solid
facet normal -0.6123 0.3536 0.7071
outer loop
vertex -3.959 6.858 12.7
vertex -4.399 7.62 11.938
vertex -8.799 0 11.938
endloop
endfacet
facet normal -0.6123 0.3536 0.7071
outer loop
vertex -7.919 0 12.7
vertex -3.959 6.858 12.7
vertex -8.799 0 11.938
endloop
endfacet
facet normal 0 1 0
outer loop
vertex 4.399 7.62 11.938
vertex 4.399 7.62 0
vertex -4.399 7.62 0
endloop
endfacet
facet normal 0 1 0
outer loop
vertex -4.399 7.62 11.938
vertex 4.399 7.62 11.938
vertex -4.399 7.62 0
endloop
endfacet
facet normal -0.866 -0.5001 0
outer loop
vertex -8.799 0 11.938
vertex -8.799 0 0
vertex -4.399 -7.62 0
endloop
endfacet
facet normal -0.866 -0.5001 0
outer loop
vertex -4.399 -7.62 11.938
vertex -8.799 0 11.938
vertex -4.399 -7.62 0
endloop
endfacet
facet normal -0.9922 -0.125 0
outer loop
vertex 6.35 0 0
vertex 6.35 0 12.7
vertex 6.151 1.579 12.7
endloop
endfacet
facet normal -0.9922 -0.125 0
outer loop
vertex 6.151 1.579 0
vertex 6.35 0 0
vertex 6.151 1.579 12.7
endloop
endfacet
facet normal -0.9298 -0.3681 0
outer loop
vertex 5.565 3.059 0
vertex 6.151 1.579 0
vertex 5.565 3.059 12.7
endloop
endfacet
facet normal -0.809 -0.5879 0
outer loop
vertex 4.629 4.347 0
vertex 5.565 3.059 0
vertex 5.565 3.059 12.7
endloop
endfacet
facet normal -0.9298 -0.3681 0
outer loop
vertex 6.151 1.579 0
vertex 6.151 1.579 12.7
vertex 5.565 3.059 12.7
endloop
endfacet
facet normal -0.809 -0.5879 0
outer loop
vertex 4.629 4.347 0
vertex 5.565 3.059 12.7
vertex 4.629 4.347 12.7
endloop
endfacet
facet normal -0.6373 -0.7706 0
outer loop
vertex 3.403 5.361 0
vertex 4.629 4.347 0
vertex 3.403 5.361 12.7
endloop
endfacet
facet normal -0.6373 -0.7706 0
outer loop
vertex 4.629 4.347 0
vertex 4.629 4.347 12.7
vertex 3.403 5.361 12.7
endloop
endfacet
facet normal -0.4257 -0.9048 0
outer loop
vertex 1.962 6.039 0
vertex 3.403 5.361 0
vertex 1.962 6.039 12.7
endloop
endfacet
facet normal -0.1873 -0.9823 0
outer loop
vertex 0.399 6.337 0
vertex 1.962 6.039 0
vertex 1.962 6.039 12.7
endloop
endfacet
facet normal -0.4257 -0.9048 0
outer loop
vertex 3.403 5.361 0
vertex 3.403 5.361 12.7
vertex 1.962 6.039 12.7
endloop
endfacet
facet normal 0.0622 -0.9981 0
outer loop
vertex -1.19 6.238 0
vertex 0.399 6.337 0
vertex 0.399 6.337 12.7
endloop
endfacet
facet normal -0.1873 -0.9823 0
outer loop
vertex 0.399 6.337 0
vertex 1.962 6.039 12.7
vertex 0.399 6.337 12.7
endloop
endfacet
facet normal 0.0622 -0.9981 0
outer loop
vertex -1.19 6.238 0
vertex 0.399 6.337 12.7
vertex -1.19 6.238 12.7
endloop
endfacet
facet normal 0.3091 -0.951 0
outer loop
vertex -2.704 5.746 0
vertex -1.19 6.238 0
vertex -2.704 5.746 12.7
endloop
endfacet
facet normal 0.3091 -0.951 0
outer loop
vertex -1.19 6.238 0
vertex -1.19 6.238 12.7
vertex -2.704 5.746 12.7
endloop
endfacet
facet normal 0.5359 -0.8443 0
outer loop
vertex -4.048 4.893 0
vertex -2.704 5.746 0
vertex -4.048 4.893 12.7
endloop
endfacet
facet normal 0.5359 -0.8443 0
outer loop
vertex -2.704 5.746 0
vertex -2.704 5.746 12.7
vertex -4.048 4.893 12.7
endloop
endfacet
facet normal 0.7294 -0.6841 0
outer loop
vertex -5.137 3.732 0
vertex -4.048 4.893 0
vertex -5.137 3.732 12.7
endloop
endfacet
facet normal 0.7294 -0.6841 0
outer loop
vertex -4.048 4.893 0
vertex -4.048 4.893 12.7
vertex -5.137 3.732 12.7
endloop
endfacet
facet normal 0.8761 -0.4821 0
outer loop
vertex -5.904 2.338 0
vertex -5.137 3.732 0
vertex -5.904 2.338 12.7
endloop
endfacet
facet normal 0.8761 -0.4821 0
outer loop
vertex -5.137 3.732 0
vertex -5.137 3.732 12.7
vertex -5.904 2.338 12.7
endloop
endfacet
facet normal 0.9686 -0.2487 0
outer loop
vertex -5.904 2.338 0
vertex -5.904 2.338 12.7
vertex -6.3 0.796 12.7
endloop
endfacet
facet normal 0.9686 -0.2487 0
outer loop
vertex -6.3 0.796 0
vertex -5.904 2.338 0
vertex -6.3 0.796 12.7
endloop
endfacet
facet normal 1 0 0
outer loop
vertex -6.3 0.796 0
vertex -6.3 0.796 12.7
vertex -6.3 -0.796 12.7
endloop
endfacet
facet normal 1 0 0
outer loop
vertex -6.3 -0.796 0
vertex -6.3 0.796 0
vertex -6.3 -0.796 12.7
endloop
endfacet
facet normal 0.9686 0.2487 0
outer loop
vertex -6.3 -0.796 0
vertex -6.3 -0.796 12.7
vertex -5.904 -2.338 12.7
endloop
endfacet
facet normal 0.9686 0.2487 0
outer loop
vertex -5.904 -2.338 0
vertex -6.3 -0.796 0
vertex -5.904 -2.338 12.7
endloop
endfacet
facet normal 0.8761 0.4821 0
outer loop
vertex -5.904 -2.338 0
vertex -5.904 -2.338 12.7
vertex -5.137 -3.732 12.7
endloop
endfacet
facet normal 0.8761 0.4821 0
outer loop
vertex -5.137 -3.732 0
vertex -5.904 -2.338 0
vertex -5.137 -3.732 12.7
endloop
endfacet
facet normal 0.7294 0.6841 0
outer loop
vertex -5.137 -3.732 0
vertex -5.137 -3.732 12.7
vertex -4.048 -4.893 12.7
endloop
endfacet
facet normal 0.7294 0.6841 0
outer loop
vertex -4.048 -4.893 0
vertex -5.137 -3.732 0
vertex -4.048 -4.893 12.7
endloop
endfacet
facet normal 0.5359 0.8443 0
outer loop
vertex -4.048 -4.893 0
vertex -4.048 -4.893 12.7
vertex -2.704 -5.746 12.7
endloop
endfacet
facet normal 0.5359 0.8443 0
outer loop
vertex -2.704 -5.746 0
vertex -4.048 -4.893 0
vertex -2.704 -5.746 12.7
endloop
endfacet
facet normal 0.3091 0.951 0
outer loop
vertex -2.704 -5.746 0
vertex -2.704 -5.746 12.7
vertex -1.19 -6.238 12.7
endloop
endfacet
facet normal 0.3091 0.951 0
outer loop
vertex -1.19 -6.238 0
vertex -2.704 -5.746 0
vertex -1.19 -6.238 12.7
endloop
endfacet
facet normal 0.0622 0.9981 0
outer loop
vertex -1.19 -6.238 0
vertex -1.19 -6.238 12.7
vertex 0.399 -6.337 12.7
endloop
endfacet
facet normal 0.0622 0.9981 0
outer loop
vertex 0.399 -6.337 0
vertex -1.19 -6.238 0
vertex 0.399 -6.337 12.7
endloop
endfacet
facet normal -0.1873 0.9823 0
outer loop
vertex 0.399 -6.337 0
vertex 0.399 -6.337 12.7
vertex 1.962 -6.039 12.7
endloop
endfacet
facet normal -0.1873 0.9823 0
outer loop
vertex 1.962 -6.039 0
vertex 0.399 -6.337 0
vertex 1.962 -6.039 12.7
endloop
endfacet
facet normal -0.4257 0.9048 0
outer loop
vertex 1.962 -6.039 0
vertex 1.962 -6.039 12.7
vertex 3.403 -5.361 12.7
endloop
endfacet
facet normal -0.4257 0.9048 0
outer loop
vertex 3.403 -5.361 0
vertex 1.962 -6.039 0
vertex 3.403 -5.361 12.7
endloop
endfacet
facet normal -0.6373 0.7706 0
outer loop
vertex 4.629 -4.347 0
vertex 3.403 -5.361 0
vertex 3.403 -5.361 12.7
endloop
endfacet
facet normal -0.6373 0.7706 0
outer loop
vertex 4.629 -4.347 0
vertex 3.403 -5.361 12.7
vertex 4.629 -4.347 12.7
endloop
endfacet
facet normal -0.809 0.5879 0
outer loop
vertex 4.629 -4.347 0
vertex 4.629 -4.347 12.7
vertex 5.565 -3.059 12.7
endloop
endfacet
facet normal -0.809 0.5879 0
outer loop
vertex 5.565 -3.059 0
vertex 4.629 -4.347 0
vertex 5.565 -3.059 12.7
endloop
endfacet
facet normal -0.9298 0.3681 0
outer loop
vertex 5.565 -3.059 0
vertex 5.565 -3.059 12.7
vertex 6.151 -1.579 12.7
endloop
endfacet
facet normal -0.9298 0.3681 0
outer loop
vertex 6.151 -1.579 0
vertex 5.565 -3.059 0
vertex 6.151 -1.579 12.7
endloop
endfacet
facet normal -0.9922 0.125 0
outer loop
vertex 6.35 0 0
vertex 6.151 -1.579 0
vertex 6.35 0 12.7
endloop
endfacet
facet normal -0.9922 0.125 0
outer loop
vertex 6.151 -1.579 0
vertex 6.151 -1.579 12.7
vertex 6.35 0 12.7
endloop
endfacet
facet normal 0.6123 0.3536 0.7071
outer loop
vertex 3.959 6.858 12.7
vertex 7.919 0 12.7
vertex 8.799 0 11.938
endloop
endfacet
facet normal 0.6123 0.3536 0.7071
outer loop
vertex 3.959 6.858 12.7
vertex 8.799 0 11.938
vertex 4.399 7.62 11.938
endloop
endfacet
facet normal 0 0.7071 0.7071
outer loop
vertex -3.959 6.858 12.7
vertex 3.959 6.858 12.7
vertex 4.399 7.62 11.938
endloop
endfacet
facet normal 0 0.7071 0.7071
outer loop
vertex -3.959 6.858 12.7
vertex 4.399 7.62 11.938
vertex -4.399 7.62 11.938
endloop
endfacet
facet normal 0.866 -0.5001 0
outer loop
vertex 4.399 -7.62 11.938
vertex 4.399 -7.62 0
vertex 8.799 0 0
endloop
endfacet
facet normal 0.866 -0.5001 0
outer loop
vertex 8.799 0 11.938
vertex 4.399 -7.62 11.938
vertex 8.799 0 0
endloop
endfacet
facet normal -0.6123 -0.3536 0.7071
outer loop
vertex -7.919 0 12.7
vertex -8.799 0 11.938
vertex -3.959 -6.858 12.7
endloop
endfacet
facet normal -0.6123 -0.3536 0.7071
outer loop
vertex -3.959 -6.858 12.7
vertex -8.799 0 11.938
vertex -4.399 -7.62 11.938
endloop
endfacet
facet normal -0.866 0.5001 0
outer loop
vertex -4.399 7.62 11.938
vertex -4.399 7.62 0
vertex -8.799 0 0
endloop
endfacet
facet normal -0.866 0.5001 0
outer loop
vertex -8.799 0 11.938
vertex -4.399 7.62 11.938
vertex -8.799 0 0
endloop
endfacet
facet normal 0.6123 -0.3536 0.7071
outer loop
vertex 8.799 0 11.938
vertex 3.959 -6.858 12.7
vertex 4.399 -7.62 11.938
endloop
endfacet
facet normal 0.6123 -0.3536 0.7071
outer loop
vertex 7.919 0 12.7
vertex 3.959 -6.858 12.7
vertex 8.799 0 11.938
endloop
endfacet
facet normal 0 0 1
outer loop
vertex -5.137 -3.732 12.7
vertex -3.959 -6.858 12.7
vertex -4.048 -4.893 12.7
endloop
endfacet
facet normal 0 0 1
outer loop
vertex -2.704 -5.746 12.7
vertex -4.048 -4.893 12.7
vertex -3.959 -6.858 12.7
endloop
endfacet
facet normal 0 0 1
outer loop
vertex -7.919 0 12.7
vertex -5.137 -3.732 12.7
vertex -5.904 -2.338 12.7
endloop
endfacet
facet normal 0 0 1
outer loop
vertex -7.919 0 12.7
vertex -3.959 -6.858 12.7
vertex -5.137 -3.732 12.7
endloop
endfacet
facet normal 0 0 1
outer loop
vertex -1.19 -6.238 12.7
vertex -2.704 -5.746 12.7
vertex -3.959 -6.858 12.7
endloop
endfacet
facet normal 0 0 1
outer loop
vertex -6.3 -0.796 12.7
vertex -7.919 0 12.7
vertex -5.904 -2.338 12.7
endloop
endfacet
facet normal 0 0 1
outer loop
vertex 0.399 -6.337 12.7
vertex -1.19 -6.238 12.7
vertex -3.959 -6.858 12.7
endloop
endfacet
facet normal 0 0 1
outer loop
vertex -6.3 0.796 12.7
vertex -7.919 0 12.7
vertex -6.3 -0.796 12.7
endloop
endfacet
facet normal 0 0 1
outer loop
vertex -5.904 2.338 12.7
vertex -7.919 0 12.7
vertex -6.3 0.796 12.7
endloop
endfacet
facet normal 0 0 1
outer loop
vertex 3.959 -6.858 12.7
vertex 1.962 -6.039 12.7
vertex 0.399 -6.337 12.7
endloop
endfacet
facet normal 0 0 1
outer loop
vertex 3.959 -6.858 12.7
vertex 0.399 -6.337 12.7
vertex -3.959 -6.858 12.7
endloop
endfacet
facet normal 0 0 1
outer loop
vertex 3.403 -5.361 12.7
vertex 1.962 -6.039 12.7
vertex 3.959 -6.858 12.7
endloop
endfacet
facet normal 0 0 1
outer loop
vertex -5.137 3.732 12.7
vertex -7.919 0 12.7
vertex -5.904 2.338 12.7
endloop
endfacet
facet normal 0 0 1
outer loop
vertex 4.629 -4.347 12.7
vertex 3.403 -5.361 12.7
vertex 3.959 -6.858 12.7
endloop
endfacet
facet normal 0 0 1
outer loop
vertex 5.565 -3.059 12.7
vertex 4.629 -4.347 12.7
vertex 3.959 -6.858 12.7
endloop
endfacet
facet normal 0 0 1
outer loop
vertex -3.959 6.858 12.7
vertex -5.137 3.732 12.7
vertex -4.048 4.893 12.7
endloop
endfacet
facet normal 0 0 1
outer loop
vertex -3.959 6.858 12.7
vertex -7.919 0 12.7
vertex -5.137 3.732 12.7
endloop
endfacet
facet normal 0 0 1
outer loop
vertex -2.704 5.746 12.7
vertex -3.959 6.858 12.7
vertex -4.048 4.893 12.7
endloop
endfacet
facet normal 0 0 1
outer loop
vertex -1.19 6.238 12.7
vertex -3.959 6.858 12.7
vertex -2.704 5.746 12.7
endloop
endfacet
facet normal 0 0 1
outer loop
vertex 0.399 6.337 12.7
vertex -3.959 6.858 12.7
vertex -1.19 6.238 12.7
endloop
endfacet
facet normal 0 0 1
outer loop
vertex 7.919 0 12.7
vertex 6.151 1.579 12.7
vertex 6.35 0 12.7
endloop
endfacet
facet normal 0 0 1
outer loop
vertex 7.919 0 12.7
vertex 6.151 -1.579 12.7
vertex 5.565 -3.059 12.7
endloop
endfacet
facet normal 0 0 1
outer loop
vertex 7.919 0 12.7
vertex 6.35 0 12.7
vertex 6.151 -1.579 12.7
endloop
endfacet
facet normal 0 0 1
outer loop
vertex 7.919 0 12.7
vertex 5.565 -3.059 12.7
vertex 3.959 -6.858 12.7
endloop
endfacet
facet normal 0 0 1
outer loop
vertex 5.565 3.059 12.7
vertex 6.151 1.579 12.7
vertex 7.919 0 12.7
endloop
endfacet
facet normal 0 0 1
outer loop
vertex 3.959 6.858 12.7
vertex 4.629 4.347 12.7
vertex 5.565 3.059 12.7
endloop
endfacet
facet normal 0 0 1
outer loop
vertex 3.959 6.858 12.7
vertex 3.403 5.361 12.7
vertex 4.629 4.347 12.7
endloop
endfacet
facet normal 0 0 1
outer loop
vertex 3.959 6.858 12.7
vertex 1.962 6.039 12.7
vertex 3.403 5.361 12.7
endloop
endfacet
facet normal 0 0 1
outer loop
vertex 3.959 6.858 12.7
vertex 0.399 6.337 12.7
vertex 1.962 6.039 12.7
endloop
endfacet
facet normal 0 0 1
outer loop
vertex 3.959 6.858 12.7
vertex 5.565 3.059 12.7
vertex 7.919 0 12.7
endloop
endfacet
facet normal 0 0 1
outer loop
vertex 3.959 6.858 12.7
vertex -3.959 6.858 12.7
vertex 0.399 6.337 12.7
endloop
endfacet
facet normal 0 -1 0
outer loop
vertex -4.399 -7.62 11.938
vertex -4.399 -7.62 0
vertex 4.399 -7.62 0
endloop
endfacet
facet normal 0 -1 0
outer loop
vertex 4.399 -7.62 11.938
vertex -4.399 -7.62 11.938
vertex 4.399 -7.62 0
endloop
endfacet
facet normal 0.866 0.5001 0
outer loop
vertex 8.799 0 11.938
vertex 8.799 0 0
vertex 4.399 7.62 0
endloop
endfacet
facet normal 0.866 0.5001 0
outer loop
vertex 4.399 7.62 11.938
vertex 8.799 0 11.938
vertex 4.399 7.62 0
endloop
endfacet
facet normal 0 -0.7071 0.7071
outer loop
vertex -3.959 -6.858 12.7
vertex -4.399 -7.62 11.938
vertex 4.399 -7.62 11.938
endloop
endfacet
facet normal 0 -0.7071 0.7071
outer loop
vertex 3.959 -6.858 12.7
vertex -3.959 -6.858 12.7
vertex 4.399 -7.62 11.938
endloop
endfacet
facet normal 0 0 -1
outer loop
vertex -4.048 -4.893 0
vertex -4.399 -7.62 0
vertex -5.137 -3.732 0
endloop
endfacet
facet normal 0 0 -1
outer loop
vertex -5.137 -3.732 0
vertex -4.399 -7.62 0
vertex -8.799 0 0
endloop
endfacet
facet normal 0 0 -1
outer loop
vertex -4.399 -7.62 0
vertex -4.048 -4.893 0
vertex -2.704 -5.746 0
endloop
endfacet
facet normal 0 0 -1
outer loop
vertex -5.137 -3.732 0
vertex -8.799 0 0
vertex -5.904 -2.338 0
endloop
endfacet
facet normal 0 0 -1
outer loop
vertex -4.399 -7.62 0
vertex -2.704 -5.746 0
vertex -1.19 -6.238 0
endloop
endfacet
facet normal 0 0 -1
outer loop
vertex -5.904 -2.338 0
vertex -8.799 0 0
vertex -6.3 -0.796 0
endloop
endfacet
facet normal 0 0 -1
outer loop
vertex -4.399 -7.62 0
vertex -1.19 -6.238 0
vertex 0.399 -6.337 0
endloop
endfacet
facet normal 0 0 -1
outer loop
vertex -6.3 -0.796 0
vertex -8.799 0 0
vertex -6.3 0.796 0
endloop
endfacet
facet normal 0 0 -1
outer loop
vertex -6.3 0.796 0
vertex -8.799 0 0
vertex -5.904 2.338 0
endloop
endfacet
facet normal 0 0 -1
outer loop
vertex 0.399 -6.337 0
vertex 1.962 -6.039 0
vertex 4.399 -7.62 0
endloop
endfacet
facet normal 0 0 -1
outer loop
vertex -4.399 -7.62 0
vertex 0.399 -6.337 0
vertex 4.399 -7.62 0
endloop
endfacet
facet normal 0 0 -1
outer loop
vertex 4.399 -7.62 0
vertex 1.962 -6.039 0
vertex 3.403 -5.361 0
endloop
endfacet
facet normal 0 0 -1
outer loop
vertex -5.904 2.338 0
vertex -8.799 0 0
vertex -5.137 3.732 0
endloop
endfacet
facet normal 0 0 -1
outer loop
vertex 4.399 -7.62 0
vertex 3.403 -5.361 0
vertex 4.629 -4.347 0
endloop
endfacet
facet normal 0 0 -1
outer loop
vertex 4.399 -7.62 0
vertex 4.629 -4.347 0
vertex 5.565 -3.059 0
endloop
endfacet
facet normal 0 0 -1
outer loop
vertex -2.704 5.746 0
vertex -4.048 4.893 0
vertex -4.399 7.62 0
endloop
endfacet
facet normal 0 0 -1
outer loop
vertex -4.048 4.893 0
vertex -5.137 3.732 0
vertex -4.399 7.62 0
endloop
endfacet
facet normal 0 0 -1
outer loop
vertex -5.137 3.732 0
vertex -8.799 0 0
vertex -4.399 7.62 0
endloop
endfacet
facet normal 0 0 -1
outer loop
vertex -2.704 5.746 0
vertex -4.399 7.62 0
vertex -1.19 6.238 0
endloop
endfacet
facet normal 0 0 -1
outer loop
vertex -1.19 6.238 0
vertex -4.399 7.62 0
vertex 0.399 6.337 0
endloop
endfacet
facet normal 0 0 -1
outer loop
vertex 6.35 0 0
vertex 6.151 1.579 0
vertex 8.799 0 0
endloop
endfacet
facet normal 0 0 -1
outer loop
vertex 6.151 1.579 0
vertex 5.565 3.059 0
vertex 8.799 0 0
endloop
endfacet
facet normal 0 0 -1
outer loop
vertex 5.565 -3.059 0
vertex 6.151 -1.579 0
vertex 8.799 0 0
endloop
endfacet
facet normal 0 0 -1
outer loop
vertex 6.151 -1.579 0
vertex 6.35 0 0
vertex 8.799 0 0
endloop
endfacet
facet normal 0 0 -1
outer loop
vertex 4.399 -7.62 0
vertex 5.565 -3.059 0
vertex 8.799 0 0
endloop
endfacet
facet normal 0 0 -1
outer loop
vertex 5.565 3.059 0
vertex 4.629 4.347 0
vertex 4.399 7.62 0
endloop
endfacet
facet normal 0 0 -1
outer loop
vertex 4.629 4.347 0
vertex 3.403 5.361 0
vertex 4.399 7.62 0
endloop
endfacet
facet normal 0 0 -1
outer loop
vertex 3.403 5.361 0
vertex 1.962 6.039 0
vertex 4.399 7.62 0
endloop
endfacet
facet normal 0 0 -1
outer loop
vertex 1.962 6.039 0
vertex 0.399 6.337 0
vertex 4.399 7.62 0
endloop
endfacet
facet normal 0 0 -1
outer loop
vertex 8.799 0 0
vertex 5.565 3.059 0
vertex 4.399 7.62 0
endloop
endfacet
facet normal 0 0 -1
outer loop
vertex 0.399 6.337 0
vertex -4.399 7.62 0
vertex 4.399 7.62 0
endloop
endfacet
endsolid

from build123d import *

# Parameters (mm, degrees)
EXTRUDE1_DEPTH     = 12.7
SKETCH4_R          = 6.35
CUT_EXTRUDE1_DEPTH = 13.7
CHAMFER2_SIZE      = 0.762


with BuildPart() as part:
    # Sketch2 → Extrude1 (new body)
    with BuildSketch(Plane.XY):
        Polygon((8.798818102, 0), (4.399409051, 7.62), (-4.399409051, 7.62), (-8.798818102, 0), (-4.399409051, -7.62), (4.399409051, -7.62), align=None)
    extrude(amount=EXTRUDE1_DEPTH)

    # Sketch4 → Cut-Extrude1 (cut, through all)
    with BuildSketch(Plane.XY.offset(12.7)):
        Circle(SKETCH4_R)
    extrude(amount=-CUT_EXTRUDE1_DEPTH, mode=Mode.SUBTRACT)

    # Chamfer2
    chamfer2_edges = [part.edges().sort_by_distance(p)[0] for p in [
        (0, 7.62, 12.7),
        (-6.599113577, 3.81, 12.7),
        (-6.599113577, -3.81, 12.7),
        (0, -7.62, 12.7),
        (6.599113577, -3.81, 12.7),
        (6.599113577, 3.81, 12.7),
    ]]
    chamfer(chamfer2_edges, length=CHAMFER2_SIZE)


solid = part.part
